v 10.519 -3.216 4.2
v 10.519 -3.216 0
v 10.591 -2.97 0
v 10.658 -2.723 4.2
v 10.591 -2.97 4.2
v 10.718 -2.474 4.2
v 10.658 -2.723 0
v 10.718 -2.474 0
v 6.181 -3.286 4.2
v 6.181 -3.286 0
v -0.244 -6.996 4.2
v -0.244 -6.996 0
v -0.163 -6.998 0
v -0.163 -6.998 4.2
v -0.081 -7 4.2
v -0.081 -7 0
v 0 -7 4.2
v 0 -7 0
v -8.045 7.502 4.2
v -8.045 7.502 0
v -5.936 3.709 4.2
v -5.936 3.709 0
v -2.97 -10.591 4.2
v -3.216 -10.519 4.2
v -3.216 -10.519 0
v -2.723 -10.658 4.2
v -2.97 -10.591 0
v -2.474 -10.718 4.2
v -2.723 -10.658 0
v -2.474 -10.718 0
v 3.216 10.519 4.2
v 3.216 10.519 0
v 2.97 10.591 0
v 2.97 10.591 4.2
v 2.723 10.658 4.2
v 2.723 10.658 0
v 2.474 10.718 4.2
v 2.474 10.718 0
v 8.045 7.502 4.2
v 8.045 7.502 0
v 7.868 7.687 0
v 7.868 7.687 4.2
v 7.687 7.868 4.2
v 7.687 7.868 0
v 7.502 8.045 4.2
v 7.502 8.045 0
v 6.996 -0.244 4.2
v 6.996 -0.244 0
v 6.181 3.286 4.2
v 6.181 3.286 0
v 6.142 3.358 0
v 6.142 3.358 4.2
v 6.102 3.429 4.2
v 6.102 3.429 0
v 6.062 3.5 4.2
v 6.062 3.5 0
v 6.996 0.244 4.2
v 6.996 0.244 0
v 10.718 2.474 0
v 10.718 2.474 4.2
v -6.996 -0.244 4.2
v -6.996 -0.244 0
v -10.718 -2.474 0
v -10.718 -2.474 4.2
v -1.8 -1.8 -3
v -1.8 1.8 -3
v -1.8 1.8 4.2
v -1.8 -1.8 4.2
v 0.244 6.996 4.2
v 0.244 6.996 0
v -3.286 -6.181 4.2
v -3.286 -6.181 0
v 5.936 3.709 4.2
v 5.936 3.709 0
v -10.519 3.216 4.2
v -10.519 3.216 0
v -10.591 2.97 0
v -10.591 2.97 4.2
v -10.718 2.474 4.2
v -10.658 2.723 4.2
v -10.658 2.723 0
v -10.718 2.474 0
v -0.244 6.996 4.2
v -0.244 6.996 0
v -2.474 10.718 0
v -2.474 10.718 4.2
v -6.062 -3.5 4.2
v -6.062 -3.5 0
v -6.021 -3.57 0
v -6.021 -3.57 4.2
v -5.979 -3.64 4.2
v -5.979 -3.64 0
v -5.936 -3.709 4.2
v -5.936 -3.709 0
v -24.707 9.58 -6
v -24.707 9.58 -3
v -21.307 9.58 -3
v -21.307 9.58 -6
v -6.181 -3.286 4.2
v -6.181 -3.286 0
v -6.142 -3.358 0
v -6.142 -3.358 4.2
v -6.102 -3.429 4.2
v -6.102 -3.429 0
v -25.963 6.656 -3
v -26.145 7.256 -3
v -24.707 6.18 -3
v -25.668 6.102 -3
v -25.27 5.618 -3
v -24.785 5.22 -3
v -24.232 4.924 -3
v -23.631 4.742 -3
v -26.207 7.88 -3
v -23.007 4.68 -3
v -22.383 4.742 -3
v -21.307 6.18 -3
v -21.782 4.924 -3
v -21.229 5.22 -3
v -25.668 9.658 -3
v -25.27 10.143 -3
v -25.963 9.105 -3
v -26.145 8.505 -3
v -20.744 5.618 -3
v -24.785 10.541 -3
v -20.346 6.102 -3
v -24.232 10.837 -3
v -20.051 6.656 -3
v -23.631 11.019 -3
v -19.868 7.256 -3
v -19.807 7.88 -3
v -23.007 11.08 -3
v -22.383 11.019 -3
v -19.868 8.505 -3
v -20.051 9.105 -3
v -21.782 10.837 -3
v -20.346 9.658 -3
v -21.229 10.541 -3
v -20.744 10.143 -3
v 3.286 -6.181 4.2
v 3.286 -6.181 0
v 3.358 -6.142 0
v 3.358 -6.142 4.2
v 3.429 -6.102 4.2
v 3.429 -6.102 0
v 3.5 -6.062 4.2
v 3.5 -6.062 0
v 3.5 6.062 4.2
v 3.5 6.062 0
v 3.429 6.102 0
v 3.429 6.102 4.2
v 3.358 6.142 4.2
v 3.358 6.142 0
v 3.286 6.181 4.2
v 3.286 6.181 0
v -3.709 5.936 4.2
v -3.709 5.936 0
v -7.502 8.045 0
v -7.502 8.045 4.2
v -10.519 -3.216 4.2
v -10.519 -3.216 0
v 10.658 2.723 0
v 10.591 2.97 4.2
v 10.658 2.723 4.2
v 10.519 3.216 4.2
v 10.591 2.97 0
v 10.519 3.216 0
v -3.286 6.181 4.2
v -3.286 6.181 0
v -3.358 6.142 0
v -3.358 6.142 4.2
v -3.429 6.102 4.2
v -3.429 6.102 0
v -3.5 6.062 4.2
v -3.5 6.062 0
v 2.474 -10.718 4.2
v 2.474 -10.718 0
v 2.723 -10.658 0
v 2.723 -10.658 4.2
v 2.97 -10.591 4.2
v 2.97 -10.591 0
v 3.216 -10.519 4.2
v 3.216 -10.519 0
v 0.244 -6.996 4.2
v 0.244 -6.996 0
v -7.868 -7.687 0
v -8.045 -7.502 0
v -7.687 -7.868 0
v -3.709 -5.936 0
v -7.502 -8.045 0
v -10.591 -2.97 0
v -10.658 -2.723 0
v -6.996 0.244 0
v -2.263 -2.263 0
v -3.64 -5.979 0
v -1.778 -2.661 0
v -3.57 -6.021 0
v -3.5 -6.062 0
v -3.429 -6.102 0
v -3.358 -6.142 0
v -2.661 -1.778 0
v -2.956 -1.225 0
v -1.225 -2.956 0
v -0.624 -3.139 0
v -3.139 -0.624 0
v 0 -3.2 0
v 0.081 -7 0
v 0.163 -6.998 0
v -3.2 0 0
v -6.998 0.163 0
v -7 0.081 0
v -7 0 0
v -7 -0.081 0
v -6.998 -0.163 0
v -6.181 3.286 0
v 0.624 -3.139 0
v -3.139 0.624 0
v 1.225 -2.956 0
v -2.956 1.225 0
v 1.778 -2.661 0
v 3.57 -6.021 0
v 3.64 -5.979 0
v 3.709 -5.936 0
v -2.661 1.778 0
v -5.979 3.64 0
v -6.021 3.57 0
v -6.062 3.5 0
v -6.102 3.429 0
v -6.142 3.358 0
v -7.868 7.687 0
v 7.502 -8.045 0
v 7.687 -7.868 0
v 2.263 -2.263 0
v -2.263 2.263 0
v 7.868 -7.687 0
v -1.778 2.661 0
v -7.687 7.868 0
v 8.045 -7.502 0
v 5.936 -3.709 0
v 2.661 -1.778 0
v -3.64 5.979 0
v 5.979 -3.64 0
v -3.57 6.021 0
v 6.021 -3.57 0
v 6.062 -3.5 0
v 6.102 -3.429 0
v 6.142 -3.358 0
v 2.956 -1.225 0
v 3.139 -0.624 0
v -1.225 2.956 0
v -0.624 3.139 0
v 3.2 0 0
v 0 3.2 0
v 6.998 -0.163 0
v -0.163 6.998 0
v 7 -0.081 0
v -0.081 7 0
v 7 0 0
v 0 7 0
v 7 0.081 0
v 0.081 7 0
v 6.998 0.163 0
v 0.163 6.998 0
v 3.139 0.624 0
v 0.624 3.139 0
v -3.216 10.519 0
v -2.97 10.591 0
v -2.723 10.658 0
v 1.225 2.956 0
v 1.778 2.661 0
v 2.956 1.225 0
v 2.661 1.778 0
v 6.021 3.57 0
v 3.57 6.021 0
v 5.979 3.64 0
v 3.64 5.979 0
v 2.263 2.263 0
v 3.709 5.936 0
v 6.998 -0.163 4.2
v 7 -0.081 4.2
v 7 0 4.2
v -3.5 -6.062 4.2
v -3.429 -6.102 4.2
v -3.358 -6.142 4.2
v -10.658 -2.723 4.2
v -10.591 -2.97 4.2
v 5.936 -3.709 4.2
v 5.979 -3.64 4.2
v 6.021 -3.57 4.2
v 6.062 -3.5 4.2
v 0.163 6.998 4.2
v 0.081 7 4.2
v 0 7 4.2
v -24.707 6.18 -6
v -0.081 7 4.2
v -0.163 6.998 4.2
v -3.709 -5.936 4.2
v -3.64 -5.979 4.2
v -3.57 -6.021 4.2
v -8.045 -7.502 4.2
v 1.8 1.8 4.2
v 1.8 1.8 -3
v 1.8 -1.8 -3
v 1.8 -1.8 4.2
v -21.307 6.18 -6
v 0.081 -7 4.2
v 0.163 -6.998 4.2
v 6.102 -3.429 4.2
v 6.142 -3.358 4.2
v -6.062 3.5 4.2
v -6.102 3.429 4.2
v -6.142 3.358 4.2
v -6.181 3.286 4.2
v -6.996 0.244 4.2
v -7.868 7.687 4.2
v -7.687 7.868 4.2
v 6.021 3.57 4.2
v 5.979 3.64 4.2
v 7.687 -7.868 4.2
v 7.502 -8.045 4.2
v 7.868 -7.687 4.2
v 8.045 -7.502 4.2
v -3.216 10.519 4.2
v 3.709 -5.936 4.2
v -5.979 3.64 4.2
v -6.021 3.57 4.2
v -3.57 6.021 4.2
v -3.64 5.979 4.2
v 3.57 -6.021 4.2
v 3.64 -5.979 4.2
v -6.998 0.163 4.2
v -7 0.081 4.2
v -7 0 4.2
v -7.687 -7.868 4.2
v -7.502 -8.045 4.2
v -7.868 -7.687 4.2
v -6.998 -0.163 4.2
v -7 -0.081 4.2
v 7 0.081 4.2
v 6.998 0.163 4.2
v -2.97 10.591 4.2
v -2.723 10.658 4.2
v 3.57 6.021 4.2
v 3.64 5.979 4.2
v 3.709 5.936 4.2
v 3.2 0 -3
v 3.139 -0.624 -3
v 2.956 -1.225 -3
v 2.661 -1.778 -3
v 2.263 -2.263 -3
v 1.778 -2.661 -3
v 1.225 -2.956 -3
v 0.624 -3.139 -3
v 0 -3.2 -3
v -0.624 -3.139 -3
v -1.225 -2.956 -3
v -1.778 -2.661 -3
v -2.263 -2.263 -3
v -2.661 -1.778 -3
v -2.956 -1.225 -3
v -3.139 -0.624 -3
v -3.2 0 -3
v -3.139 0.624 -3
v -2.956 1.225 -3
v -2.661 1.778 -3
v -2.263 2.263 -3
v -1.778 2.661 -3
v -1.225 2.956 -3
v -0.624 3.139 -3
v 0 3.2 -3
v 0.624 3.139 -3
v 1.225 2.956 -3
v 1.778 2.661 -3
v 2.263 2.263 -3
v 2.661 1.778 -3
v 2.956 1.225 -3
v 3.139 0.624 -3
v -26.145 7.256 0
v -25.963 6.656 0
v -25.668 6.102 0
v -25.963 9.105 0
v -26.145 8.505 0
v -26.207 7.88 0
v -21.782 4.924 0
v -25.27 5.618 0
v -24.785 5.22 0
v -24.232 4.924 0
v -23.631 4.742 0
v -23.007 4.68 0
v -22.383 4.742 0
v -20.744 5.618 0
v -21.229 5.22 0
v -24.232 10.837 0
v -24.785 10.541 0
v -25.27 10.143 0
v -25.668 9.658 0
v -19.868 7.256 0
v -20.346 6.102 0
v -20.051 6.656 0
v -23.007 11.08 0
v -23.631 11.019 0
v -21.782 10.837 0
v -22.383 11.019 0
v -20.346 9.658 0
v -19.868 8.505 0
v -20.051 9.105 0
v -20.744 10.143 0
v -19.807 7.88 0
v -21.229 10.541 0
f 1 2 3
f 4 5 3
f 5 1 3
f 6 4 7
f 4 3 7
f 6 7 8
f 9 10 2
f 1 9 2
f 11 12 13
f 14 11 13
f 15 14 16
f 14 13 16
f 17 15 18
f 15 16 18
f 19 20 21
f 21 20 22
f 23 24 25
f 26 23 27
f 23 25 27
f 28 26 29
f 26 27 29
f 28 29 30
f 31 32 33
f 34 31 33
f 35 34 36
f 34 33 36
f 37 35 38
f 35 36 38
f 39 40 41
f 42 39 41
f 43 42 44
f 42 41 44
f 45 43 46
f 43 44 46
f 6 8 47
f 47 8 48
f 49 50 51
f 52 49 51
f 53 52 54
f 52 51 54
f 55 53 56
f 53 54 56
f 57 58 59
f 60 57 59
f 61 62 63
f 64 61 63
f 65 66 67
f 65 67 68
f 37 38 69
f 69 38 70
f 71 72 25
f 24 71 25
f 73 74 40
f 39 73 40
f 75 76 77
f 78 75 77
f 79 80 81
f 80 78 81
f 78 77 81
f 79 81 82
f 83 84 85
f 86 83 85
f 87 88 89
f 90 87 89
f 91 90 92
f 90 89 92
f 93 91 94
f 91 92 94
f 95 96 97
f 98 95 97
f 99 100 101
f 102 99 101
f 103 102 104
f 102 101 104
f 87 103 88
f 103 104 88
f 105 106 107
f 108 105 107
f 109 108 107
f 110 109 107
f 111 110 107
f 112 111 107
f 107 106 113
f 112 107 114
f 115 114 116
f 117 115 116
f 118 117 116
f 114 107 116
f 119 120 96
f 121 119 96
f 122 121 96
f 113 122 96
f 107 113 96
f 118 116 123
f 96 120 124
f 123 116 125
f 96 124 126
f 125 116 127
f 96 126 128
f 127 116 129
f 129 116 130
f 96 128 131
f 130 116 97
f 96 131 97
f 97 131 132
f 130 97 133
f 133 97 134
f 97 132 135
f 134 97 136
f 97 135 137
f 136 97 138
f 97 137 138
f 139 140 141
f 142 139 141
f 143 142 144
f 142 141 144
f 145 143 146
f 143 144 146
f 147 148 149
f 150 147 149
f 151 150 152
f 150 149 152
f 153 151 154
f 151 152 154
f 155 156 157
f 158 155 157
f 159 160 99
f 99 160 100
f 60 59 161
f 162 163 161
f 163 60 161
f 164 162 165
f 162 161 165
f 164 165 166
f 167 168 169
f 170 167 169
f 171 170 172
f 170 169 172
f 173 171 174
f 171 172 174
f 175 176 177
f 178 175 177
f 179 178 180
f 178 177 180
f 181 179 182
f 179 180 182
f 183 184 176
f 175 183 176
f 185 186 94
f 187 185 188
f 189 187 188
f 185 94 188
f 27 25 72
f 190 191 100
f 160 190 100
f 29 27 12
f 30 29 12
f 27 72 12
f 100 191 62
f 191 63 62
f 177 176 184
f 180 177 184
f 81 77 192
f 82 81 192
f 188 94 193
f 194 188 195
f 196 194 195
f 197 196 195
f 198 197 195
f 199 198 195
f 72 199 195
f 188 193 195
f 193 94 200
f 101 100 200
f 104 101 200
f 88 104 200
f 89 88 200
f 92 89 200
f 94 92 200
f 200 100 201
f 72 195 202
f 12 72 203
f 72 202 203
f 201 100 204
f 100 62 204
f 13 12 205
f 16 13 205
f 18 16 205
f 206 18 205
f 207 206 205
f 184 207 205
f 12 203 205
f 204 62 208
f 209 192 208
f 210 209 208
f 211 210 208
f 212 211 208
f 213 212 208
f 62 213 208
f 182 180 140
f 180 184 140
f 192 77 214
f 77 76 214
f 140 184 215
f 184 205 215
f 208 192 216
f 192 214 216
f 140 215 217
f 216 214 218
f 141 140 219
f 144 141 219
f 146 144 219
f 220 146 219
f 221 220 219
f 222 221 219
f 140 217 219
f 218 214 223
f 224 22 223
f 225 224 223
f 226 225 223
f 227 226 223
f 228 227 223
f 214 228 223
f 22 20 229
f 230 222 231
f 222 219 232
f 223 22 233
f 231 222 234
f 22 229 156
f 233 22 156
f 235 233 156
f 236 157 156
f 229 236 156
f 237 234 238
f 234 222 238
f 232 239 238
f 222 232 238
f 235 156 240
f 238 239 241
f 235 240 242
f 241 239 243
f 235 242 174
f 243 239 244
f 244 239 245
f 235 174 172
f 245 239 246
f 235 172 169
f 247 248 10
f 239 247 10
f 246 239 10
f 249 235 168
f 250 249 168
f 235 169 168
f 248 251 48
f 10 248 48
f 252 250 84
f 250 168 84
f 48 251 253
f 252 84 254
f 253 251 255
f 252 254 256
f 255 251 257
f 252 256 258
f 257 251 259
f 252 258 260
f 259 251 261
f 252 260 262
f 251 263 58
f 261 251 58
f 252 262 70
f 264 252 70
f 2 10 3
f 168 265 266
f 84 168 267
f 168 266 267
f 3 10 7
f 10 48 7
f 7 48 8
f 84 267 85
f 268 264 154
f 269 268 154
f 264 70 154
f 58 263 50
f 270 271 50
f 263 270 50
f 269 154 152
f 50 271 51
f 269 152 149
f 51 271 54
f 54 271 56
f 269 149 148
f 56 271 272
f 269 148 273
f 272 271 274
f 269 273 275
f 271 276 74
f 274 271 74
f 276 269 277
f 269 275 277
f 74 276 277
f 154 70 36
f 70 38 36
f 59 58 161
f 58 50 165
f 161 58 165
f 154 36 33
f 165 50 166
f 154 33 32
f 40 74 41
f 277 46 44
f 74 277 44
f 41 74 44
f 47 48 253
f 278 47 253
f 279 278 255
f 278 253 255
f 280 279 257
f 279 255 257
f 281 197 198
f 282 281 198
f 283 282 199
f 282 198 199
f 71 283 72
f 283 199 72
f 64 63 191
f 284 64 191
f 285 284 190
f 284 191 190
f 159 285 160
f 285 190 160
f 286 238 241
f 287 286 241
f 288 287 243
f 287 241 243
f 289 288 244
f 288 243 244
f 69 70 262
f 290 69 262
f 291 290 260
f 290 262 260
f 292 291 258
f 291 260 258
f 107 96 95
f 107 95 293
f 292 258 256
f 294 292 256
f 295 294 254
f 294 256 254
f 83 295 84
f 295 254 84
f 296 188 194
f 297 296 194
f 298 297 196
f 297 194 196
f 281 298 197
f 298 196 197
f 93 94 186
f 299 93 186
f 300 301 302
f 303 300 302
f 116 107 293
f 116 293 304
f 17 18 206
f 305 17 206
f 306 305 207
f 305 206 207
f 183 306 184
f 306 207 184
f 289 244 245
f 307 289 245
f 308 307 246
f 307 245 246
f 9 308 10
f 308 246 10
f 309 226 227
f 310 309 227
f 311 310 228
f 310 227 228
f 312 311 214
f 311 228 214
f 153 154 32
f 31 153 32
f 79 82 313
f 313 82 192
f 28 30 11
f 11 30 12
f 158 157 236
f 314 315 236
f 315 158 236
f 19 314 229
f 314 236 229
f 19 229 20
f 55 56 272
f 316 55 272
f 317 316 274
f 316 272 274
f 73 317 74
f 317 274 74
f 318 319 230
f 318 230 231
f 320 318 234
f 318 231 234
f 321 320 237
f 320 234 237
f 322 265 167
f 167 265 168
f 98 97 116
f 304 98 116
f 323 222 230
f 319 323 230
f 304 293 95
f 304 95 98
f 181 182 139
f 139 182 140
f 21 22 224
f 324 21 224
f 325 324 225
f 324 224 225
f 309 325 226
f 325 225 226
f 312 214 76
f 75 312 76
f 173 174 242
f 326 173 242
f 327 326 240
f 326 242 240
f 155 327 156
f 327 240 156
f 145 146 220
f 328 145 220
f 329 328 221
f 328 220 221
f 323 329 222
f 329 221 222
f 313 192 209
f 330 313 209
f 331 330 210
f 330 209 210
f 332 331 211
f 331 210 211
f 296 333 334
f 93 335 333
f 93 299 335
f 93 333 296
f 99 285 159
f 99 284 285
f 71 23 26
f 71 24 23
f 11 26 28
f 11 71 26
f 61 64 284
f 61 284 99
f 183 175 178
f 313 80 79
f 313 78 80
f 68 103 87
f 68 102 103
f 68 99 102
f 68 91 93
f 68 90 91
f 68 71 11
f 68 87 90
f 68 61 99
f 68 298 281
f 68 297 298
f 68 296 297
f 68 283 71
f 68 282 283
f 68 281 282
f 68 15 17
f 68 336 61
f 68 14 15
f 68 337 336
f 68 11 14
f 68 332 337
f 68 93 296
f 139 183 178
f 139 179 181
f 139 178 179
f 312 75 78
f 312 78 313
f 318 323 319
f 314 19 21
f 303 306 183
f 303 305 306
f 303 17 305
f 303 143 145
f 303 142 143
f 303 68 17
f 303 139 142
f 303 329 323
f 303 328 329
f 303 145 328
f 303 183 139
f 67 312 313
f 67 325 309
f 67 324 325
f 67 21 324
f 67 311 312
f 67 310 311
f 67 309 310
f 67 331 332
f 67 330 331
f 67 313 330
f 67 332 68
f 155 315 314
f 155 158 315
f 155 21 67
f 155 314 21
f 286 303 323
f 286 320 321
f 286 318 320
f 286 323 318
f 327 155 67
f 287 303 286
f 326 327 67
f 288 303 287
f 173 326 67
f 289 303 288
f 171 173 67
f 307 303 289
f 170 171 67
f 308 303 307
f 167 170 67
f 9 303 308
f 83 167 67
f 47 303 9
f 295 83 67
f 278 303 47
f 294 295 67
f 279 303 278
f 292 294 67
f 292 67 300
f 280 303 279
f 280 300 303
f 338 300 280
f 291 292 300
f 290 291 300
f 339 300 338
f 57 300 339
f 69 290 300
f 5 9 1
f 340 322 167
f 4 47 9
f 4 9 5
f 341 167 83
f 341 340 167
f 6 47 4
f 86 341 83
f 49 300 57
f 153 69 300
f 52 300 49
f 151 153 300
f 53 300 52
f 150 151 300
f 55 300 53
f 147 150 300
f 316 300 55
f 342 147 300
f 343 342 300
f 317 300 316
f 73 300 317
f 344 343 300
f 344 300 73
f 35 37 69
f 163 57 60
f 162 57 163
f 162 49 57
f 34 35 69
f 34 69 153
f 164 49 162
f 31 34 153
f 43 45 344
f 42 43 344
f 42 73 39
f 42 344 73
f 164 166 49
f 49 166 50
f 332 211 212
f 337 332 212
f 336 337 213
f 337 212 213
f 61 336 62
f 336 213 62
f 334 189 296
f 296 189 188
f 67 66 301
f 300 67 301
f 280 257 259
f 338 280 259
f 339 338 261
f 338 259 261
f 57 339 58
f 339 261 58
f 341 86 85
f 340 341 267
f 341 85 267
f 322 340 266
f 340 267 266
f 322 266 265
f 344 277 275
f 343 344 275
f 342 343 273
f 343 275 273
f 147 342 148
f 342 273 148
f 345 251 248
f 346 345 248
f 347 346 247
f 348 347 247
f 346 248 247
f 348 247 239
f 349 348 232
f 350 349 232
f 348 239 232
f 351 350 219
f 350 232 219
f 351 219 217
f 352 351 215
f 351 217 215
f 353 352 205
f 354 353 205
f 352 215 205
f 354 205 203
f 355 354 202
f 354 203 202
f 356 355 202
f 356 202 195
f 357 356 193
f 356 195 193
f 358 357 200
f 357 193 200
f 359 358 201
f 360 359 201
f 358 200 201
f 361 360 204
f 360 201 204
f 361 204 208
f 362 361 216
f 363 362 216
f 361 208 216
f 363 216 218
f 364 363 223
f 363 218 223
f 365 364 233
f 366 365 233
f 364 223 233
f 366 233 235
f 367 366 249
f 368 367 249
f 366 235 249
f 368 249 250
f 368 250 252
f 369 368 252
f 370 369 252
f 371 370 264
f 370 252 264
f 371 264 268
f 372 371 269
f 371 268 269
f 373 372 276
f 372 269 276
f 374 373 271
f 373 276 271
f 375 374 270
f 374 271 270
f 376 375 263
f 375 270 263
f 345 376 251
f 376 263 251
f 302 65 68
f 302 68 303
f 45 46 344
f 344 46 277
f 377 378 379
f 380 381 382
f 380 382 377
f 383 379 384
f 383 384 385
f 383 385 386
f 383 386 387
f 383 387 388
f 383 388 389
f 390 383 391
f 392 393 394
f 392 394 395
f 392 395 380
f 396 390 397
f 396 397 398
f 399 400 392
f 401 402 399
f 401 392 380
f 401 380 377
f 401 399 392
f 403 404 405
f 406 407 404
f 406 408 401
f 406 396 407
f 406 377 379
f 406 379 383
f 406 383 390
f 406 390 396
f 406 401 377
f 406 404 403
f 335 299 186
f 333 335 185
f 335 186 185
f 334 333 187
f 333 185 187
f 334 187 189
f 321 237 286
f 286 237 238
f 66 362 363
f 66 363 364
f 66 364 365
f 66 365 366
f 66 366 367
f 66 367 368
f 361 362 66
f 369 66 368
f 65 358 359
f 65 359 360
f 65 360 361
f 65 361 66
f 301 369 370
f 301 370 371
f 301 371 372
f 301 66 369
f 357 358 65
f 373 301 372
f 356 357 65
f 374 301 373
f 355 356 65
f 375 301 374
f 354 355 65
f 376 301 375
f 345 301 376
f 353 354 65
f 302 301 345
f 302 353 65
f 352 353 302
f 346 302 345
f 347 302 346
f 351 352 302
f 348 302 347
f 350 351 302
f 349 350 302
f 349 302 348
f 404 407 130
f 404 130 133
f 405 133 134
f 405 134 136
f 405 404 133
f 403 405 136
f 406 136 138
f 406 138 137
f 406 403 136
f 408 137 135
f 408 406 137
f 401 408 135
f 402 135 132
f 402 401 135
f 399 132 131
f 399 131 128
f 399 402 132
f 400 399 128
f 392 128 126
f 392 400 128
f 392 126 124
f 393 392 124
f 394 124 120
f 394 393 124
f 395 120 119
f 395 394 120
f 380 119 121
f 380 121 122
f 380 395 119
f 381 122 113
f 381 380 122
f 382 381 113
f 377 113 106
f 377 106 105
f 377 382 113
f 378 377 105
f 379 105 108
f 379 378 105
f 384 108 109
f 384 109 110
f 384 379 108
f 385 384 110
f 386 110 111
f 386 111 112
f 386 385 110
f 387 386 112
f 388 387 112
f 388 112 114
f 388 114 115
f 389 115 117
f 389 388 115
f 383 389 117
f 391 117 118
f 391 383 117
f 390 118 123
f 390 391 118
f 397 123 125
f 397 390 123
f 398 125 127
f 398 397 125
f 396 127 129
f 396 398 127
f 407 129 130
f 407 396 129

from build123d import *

# Parameters (mm, degrees)
F0_R            = 11
F1_DEPTH        = 4.2
F3_DEPTH        = 4.201
F3_COPIES_COUNT = 12
F5_R            = 3.2
F6_DEPTH        = 3
F7_W            = 3.6
F7_H            = 3.6
F8_DEPTH        = 7.201
F9_R            = 3.2
F10_DEPTH       = 3
F11_W           = 3.4
F11_H           = 3.4
F12_DEPTH       = 3


# Not quite as in the source:
# - a pattern or mirror of a feature is missing from the dataset's text; its kind, count and spacing are read off the source's solid


with BuildPart() as f1:
    # F0 (on Top) → F1 (new body)
    with BuildSketch(Plane.XY):
        Circle(F0_R)
    extrude(amount=F1_DEPTH)

    # F2 (on face) → F3 (cut, through all)
    with BuildSketch(Plane(origin=(0, 0, 0), x_dir=(1, 0, 0), z_dir=(0, 0, -1))):
        with BuildLine():
            ThreePointArc((-6.9957357891, -0.2442964769), (-6.9989338661, -0.1221668451), (-7, 0))
            Line((-7, 0), (-11, 0))
            ThreePointArc((-11, 0), (-10.9292904124, -1.2452353514), (-10.7180707126, -2.4744615978))
            Line((-10.7180707126, -2.4744615978), (-6.9957357891, -0.2442964769))
        make_face()
        with BuildLine():
            Line((-11, 0), (-7, 0))
            ThreePointArc((-7, 0), (-6.9989338661, 0.1221668451), (-6.9957357891, 0.2442964769))
            Line((-6.9957357891, 0.2442964769), (-10.7180707126, 2.4744615978))
            ThreePointArc((-10.7180707126, 2.4744615978), (-10.9292904124, 1.2452353514), (-11, 0))
        make_face()
    f3 = extrude(amount=-F3_DEPTH, mode=Mode.SUBTRACT)

    # F3_copies: F3 ×12 about axis
    f3_copies_axis = Axis((0, 0, 0), (0, 0, 1))
    for i in range(1, F3_COPIES_COUNT):
        add(f3.rotate(f3_copies_axis, i * 360 / F3_COPIES_COUNT), mode=Mode.SUBTRACT)

    # F5 (on face) → F6 (join)
    with BuildSketch(Plane(origin=(0, 0, 0), x_dir=(1, 0, 0), z_dir=(0, 0, -1))):
        Circle(F5_R)
    extrude(amount=F6_DEPTH)

    # F7 (on face) → F8 (cut, through all)
    with BuildSketch(Plane(origin=(0, 0, -3), x_dir=(1, 0, 0), z_dir=(0, 0, -1))):
        Rectangle(F7_W, F7_H)
    extrude(amount=-F8_DEPTH, mode=Mode.SUBTRACT)


with BuildPart() as f10:
    # F9 (on Top) → F10 (new body)
    with BuildSketch(Plane.XY):
        with Locations((-23.0069868267, 7.8802704811)):
            Circle(F9_R)
    extrude(amount=-F10_DEPTH)

    # F11 (on face) → F12 (join)
    with BuildSketch(Plane(origin=(0, 0, -3), x_dir=(1, 0, 0), z_dir=(0, 0, -1))):
        with Locations((-23.0069868267, -7.8802704811)):
            Rectangle(F11_W, F11_H)
    extrude(amount=F12_DEPTH)


solid = Compound([f1.part, f10.part])
